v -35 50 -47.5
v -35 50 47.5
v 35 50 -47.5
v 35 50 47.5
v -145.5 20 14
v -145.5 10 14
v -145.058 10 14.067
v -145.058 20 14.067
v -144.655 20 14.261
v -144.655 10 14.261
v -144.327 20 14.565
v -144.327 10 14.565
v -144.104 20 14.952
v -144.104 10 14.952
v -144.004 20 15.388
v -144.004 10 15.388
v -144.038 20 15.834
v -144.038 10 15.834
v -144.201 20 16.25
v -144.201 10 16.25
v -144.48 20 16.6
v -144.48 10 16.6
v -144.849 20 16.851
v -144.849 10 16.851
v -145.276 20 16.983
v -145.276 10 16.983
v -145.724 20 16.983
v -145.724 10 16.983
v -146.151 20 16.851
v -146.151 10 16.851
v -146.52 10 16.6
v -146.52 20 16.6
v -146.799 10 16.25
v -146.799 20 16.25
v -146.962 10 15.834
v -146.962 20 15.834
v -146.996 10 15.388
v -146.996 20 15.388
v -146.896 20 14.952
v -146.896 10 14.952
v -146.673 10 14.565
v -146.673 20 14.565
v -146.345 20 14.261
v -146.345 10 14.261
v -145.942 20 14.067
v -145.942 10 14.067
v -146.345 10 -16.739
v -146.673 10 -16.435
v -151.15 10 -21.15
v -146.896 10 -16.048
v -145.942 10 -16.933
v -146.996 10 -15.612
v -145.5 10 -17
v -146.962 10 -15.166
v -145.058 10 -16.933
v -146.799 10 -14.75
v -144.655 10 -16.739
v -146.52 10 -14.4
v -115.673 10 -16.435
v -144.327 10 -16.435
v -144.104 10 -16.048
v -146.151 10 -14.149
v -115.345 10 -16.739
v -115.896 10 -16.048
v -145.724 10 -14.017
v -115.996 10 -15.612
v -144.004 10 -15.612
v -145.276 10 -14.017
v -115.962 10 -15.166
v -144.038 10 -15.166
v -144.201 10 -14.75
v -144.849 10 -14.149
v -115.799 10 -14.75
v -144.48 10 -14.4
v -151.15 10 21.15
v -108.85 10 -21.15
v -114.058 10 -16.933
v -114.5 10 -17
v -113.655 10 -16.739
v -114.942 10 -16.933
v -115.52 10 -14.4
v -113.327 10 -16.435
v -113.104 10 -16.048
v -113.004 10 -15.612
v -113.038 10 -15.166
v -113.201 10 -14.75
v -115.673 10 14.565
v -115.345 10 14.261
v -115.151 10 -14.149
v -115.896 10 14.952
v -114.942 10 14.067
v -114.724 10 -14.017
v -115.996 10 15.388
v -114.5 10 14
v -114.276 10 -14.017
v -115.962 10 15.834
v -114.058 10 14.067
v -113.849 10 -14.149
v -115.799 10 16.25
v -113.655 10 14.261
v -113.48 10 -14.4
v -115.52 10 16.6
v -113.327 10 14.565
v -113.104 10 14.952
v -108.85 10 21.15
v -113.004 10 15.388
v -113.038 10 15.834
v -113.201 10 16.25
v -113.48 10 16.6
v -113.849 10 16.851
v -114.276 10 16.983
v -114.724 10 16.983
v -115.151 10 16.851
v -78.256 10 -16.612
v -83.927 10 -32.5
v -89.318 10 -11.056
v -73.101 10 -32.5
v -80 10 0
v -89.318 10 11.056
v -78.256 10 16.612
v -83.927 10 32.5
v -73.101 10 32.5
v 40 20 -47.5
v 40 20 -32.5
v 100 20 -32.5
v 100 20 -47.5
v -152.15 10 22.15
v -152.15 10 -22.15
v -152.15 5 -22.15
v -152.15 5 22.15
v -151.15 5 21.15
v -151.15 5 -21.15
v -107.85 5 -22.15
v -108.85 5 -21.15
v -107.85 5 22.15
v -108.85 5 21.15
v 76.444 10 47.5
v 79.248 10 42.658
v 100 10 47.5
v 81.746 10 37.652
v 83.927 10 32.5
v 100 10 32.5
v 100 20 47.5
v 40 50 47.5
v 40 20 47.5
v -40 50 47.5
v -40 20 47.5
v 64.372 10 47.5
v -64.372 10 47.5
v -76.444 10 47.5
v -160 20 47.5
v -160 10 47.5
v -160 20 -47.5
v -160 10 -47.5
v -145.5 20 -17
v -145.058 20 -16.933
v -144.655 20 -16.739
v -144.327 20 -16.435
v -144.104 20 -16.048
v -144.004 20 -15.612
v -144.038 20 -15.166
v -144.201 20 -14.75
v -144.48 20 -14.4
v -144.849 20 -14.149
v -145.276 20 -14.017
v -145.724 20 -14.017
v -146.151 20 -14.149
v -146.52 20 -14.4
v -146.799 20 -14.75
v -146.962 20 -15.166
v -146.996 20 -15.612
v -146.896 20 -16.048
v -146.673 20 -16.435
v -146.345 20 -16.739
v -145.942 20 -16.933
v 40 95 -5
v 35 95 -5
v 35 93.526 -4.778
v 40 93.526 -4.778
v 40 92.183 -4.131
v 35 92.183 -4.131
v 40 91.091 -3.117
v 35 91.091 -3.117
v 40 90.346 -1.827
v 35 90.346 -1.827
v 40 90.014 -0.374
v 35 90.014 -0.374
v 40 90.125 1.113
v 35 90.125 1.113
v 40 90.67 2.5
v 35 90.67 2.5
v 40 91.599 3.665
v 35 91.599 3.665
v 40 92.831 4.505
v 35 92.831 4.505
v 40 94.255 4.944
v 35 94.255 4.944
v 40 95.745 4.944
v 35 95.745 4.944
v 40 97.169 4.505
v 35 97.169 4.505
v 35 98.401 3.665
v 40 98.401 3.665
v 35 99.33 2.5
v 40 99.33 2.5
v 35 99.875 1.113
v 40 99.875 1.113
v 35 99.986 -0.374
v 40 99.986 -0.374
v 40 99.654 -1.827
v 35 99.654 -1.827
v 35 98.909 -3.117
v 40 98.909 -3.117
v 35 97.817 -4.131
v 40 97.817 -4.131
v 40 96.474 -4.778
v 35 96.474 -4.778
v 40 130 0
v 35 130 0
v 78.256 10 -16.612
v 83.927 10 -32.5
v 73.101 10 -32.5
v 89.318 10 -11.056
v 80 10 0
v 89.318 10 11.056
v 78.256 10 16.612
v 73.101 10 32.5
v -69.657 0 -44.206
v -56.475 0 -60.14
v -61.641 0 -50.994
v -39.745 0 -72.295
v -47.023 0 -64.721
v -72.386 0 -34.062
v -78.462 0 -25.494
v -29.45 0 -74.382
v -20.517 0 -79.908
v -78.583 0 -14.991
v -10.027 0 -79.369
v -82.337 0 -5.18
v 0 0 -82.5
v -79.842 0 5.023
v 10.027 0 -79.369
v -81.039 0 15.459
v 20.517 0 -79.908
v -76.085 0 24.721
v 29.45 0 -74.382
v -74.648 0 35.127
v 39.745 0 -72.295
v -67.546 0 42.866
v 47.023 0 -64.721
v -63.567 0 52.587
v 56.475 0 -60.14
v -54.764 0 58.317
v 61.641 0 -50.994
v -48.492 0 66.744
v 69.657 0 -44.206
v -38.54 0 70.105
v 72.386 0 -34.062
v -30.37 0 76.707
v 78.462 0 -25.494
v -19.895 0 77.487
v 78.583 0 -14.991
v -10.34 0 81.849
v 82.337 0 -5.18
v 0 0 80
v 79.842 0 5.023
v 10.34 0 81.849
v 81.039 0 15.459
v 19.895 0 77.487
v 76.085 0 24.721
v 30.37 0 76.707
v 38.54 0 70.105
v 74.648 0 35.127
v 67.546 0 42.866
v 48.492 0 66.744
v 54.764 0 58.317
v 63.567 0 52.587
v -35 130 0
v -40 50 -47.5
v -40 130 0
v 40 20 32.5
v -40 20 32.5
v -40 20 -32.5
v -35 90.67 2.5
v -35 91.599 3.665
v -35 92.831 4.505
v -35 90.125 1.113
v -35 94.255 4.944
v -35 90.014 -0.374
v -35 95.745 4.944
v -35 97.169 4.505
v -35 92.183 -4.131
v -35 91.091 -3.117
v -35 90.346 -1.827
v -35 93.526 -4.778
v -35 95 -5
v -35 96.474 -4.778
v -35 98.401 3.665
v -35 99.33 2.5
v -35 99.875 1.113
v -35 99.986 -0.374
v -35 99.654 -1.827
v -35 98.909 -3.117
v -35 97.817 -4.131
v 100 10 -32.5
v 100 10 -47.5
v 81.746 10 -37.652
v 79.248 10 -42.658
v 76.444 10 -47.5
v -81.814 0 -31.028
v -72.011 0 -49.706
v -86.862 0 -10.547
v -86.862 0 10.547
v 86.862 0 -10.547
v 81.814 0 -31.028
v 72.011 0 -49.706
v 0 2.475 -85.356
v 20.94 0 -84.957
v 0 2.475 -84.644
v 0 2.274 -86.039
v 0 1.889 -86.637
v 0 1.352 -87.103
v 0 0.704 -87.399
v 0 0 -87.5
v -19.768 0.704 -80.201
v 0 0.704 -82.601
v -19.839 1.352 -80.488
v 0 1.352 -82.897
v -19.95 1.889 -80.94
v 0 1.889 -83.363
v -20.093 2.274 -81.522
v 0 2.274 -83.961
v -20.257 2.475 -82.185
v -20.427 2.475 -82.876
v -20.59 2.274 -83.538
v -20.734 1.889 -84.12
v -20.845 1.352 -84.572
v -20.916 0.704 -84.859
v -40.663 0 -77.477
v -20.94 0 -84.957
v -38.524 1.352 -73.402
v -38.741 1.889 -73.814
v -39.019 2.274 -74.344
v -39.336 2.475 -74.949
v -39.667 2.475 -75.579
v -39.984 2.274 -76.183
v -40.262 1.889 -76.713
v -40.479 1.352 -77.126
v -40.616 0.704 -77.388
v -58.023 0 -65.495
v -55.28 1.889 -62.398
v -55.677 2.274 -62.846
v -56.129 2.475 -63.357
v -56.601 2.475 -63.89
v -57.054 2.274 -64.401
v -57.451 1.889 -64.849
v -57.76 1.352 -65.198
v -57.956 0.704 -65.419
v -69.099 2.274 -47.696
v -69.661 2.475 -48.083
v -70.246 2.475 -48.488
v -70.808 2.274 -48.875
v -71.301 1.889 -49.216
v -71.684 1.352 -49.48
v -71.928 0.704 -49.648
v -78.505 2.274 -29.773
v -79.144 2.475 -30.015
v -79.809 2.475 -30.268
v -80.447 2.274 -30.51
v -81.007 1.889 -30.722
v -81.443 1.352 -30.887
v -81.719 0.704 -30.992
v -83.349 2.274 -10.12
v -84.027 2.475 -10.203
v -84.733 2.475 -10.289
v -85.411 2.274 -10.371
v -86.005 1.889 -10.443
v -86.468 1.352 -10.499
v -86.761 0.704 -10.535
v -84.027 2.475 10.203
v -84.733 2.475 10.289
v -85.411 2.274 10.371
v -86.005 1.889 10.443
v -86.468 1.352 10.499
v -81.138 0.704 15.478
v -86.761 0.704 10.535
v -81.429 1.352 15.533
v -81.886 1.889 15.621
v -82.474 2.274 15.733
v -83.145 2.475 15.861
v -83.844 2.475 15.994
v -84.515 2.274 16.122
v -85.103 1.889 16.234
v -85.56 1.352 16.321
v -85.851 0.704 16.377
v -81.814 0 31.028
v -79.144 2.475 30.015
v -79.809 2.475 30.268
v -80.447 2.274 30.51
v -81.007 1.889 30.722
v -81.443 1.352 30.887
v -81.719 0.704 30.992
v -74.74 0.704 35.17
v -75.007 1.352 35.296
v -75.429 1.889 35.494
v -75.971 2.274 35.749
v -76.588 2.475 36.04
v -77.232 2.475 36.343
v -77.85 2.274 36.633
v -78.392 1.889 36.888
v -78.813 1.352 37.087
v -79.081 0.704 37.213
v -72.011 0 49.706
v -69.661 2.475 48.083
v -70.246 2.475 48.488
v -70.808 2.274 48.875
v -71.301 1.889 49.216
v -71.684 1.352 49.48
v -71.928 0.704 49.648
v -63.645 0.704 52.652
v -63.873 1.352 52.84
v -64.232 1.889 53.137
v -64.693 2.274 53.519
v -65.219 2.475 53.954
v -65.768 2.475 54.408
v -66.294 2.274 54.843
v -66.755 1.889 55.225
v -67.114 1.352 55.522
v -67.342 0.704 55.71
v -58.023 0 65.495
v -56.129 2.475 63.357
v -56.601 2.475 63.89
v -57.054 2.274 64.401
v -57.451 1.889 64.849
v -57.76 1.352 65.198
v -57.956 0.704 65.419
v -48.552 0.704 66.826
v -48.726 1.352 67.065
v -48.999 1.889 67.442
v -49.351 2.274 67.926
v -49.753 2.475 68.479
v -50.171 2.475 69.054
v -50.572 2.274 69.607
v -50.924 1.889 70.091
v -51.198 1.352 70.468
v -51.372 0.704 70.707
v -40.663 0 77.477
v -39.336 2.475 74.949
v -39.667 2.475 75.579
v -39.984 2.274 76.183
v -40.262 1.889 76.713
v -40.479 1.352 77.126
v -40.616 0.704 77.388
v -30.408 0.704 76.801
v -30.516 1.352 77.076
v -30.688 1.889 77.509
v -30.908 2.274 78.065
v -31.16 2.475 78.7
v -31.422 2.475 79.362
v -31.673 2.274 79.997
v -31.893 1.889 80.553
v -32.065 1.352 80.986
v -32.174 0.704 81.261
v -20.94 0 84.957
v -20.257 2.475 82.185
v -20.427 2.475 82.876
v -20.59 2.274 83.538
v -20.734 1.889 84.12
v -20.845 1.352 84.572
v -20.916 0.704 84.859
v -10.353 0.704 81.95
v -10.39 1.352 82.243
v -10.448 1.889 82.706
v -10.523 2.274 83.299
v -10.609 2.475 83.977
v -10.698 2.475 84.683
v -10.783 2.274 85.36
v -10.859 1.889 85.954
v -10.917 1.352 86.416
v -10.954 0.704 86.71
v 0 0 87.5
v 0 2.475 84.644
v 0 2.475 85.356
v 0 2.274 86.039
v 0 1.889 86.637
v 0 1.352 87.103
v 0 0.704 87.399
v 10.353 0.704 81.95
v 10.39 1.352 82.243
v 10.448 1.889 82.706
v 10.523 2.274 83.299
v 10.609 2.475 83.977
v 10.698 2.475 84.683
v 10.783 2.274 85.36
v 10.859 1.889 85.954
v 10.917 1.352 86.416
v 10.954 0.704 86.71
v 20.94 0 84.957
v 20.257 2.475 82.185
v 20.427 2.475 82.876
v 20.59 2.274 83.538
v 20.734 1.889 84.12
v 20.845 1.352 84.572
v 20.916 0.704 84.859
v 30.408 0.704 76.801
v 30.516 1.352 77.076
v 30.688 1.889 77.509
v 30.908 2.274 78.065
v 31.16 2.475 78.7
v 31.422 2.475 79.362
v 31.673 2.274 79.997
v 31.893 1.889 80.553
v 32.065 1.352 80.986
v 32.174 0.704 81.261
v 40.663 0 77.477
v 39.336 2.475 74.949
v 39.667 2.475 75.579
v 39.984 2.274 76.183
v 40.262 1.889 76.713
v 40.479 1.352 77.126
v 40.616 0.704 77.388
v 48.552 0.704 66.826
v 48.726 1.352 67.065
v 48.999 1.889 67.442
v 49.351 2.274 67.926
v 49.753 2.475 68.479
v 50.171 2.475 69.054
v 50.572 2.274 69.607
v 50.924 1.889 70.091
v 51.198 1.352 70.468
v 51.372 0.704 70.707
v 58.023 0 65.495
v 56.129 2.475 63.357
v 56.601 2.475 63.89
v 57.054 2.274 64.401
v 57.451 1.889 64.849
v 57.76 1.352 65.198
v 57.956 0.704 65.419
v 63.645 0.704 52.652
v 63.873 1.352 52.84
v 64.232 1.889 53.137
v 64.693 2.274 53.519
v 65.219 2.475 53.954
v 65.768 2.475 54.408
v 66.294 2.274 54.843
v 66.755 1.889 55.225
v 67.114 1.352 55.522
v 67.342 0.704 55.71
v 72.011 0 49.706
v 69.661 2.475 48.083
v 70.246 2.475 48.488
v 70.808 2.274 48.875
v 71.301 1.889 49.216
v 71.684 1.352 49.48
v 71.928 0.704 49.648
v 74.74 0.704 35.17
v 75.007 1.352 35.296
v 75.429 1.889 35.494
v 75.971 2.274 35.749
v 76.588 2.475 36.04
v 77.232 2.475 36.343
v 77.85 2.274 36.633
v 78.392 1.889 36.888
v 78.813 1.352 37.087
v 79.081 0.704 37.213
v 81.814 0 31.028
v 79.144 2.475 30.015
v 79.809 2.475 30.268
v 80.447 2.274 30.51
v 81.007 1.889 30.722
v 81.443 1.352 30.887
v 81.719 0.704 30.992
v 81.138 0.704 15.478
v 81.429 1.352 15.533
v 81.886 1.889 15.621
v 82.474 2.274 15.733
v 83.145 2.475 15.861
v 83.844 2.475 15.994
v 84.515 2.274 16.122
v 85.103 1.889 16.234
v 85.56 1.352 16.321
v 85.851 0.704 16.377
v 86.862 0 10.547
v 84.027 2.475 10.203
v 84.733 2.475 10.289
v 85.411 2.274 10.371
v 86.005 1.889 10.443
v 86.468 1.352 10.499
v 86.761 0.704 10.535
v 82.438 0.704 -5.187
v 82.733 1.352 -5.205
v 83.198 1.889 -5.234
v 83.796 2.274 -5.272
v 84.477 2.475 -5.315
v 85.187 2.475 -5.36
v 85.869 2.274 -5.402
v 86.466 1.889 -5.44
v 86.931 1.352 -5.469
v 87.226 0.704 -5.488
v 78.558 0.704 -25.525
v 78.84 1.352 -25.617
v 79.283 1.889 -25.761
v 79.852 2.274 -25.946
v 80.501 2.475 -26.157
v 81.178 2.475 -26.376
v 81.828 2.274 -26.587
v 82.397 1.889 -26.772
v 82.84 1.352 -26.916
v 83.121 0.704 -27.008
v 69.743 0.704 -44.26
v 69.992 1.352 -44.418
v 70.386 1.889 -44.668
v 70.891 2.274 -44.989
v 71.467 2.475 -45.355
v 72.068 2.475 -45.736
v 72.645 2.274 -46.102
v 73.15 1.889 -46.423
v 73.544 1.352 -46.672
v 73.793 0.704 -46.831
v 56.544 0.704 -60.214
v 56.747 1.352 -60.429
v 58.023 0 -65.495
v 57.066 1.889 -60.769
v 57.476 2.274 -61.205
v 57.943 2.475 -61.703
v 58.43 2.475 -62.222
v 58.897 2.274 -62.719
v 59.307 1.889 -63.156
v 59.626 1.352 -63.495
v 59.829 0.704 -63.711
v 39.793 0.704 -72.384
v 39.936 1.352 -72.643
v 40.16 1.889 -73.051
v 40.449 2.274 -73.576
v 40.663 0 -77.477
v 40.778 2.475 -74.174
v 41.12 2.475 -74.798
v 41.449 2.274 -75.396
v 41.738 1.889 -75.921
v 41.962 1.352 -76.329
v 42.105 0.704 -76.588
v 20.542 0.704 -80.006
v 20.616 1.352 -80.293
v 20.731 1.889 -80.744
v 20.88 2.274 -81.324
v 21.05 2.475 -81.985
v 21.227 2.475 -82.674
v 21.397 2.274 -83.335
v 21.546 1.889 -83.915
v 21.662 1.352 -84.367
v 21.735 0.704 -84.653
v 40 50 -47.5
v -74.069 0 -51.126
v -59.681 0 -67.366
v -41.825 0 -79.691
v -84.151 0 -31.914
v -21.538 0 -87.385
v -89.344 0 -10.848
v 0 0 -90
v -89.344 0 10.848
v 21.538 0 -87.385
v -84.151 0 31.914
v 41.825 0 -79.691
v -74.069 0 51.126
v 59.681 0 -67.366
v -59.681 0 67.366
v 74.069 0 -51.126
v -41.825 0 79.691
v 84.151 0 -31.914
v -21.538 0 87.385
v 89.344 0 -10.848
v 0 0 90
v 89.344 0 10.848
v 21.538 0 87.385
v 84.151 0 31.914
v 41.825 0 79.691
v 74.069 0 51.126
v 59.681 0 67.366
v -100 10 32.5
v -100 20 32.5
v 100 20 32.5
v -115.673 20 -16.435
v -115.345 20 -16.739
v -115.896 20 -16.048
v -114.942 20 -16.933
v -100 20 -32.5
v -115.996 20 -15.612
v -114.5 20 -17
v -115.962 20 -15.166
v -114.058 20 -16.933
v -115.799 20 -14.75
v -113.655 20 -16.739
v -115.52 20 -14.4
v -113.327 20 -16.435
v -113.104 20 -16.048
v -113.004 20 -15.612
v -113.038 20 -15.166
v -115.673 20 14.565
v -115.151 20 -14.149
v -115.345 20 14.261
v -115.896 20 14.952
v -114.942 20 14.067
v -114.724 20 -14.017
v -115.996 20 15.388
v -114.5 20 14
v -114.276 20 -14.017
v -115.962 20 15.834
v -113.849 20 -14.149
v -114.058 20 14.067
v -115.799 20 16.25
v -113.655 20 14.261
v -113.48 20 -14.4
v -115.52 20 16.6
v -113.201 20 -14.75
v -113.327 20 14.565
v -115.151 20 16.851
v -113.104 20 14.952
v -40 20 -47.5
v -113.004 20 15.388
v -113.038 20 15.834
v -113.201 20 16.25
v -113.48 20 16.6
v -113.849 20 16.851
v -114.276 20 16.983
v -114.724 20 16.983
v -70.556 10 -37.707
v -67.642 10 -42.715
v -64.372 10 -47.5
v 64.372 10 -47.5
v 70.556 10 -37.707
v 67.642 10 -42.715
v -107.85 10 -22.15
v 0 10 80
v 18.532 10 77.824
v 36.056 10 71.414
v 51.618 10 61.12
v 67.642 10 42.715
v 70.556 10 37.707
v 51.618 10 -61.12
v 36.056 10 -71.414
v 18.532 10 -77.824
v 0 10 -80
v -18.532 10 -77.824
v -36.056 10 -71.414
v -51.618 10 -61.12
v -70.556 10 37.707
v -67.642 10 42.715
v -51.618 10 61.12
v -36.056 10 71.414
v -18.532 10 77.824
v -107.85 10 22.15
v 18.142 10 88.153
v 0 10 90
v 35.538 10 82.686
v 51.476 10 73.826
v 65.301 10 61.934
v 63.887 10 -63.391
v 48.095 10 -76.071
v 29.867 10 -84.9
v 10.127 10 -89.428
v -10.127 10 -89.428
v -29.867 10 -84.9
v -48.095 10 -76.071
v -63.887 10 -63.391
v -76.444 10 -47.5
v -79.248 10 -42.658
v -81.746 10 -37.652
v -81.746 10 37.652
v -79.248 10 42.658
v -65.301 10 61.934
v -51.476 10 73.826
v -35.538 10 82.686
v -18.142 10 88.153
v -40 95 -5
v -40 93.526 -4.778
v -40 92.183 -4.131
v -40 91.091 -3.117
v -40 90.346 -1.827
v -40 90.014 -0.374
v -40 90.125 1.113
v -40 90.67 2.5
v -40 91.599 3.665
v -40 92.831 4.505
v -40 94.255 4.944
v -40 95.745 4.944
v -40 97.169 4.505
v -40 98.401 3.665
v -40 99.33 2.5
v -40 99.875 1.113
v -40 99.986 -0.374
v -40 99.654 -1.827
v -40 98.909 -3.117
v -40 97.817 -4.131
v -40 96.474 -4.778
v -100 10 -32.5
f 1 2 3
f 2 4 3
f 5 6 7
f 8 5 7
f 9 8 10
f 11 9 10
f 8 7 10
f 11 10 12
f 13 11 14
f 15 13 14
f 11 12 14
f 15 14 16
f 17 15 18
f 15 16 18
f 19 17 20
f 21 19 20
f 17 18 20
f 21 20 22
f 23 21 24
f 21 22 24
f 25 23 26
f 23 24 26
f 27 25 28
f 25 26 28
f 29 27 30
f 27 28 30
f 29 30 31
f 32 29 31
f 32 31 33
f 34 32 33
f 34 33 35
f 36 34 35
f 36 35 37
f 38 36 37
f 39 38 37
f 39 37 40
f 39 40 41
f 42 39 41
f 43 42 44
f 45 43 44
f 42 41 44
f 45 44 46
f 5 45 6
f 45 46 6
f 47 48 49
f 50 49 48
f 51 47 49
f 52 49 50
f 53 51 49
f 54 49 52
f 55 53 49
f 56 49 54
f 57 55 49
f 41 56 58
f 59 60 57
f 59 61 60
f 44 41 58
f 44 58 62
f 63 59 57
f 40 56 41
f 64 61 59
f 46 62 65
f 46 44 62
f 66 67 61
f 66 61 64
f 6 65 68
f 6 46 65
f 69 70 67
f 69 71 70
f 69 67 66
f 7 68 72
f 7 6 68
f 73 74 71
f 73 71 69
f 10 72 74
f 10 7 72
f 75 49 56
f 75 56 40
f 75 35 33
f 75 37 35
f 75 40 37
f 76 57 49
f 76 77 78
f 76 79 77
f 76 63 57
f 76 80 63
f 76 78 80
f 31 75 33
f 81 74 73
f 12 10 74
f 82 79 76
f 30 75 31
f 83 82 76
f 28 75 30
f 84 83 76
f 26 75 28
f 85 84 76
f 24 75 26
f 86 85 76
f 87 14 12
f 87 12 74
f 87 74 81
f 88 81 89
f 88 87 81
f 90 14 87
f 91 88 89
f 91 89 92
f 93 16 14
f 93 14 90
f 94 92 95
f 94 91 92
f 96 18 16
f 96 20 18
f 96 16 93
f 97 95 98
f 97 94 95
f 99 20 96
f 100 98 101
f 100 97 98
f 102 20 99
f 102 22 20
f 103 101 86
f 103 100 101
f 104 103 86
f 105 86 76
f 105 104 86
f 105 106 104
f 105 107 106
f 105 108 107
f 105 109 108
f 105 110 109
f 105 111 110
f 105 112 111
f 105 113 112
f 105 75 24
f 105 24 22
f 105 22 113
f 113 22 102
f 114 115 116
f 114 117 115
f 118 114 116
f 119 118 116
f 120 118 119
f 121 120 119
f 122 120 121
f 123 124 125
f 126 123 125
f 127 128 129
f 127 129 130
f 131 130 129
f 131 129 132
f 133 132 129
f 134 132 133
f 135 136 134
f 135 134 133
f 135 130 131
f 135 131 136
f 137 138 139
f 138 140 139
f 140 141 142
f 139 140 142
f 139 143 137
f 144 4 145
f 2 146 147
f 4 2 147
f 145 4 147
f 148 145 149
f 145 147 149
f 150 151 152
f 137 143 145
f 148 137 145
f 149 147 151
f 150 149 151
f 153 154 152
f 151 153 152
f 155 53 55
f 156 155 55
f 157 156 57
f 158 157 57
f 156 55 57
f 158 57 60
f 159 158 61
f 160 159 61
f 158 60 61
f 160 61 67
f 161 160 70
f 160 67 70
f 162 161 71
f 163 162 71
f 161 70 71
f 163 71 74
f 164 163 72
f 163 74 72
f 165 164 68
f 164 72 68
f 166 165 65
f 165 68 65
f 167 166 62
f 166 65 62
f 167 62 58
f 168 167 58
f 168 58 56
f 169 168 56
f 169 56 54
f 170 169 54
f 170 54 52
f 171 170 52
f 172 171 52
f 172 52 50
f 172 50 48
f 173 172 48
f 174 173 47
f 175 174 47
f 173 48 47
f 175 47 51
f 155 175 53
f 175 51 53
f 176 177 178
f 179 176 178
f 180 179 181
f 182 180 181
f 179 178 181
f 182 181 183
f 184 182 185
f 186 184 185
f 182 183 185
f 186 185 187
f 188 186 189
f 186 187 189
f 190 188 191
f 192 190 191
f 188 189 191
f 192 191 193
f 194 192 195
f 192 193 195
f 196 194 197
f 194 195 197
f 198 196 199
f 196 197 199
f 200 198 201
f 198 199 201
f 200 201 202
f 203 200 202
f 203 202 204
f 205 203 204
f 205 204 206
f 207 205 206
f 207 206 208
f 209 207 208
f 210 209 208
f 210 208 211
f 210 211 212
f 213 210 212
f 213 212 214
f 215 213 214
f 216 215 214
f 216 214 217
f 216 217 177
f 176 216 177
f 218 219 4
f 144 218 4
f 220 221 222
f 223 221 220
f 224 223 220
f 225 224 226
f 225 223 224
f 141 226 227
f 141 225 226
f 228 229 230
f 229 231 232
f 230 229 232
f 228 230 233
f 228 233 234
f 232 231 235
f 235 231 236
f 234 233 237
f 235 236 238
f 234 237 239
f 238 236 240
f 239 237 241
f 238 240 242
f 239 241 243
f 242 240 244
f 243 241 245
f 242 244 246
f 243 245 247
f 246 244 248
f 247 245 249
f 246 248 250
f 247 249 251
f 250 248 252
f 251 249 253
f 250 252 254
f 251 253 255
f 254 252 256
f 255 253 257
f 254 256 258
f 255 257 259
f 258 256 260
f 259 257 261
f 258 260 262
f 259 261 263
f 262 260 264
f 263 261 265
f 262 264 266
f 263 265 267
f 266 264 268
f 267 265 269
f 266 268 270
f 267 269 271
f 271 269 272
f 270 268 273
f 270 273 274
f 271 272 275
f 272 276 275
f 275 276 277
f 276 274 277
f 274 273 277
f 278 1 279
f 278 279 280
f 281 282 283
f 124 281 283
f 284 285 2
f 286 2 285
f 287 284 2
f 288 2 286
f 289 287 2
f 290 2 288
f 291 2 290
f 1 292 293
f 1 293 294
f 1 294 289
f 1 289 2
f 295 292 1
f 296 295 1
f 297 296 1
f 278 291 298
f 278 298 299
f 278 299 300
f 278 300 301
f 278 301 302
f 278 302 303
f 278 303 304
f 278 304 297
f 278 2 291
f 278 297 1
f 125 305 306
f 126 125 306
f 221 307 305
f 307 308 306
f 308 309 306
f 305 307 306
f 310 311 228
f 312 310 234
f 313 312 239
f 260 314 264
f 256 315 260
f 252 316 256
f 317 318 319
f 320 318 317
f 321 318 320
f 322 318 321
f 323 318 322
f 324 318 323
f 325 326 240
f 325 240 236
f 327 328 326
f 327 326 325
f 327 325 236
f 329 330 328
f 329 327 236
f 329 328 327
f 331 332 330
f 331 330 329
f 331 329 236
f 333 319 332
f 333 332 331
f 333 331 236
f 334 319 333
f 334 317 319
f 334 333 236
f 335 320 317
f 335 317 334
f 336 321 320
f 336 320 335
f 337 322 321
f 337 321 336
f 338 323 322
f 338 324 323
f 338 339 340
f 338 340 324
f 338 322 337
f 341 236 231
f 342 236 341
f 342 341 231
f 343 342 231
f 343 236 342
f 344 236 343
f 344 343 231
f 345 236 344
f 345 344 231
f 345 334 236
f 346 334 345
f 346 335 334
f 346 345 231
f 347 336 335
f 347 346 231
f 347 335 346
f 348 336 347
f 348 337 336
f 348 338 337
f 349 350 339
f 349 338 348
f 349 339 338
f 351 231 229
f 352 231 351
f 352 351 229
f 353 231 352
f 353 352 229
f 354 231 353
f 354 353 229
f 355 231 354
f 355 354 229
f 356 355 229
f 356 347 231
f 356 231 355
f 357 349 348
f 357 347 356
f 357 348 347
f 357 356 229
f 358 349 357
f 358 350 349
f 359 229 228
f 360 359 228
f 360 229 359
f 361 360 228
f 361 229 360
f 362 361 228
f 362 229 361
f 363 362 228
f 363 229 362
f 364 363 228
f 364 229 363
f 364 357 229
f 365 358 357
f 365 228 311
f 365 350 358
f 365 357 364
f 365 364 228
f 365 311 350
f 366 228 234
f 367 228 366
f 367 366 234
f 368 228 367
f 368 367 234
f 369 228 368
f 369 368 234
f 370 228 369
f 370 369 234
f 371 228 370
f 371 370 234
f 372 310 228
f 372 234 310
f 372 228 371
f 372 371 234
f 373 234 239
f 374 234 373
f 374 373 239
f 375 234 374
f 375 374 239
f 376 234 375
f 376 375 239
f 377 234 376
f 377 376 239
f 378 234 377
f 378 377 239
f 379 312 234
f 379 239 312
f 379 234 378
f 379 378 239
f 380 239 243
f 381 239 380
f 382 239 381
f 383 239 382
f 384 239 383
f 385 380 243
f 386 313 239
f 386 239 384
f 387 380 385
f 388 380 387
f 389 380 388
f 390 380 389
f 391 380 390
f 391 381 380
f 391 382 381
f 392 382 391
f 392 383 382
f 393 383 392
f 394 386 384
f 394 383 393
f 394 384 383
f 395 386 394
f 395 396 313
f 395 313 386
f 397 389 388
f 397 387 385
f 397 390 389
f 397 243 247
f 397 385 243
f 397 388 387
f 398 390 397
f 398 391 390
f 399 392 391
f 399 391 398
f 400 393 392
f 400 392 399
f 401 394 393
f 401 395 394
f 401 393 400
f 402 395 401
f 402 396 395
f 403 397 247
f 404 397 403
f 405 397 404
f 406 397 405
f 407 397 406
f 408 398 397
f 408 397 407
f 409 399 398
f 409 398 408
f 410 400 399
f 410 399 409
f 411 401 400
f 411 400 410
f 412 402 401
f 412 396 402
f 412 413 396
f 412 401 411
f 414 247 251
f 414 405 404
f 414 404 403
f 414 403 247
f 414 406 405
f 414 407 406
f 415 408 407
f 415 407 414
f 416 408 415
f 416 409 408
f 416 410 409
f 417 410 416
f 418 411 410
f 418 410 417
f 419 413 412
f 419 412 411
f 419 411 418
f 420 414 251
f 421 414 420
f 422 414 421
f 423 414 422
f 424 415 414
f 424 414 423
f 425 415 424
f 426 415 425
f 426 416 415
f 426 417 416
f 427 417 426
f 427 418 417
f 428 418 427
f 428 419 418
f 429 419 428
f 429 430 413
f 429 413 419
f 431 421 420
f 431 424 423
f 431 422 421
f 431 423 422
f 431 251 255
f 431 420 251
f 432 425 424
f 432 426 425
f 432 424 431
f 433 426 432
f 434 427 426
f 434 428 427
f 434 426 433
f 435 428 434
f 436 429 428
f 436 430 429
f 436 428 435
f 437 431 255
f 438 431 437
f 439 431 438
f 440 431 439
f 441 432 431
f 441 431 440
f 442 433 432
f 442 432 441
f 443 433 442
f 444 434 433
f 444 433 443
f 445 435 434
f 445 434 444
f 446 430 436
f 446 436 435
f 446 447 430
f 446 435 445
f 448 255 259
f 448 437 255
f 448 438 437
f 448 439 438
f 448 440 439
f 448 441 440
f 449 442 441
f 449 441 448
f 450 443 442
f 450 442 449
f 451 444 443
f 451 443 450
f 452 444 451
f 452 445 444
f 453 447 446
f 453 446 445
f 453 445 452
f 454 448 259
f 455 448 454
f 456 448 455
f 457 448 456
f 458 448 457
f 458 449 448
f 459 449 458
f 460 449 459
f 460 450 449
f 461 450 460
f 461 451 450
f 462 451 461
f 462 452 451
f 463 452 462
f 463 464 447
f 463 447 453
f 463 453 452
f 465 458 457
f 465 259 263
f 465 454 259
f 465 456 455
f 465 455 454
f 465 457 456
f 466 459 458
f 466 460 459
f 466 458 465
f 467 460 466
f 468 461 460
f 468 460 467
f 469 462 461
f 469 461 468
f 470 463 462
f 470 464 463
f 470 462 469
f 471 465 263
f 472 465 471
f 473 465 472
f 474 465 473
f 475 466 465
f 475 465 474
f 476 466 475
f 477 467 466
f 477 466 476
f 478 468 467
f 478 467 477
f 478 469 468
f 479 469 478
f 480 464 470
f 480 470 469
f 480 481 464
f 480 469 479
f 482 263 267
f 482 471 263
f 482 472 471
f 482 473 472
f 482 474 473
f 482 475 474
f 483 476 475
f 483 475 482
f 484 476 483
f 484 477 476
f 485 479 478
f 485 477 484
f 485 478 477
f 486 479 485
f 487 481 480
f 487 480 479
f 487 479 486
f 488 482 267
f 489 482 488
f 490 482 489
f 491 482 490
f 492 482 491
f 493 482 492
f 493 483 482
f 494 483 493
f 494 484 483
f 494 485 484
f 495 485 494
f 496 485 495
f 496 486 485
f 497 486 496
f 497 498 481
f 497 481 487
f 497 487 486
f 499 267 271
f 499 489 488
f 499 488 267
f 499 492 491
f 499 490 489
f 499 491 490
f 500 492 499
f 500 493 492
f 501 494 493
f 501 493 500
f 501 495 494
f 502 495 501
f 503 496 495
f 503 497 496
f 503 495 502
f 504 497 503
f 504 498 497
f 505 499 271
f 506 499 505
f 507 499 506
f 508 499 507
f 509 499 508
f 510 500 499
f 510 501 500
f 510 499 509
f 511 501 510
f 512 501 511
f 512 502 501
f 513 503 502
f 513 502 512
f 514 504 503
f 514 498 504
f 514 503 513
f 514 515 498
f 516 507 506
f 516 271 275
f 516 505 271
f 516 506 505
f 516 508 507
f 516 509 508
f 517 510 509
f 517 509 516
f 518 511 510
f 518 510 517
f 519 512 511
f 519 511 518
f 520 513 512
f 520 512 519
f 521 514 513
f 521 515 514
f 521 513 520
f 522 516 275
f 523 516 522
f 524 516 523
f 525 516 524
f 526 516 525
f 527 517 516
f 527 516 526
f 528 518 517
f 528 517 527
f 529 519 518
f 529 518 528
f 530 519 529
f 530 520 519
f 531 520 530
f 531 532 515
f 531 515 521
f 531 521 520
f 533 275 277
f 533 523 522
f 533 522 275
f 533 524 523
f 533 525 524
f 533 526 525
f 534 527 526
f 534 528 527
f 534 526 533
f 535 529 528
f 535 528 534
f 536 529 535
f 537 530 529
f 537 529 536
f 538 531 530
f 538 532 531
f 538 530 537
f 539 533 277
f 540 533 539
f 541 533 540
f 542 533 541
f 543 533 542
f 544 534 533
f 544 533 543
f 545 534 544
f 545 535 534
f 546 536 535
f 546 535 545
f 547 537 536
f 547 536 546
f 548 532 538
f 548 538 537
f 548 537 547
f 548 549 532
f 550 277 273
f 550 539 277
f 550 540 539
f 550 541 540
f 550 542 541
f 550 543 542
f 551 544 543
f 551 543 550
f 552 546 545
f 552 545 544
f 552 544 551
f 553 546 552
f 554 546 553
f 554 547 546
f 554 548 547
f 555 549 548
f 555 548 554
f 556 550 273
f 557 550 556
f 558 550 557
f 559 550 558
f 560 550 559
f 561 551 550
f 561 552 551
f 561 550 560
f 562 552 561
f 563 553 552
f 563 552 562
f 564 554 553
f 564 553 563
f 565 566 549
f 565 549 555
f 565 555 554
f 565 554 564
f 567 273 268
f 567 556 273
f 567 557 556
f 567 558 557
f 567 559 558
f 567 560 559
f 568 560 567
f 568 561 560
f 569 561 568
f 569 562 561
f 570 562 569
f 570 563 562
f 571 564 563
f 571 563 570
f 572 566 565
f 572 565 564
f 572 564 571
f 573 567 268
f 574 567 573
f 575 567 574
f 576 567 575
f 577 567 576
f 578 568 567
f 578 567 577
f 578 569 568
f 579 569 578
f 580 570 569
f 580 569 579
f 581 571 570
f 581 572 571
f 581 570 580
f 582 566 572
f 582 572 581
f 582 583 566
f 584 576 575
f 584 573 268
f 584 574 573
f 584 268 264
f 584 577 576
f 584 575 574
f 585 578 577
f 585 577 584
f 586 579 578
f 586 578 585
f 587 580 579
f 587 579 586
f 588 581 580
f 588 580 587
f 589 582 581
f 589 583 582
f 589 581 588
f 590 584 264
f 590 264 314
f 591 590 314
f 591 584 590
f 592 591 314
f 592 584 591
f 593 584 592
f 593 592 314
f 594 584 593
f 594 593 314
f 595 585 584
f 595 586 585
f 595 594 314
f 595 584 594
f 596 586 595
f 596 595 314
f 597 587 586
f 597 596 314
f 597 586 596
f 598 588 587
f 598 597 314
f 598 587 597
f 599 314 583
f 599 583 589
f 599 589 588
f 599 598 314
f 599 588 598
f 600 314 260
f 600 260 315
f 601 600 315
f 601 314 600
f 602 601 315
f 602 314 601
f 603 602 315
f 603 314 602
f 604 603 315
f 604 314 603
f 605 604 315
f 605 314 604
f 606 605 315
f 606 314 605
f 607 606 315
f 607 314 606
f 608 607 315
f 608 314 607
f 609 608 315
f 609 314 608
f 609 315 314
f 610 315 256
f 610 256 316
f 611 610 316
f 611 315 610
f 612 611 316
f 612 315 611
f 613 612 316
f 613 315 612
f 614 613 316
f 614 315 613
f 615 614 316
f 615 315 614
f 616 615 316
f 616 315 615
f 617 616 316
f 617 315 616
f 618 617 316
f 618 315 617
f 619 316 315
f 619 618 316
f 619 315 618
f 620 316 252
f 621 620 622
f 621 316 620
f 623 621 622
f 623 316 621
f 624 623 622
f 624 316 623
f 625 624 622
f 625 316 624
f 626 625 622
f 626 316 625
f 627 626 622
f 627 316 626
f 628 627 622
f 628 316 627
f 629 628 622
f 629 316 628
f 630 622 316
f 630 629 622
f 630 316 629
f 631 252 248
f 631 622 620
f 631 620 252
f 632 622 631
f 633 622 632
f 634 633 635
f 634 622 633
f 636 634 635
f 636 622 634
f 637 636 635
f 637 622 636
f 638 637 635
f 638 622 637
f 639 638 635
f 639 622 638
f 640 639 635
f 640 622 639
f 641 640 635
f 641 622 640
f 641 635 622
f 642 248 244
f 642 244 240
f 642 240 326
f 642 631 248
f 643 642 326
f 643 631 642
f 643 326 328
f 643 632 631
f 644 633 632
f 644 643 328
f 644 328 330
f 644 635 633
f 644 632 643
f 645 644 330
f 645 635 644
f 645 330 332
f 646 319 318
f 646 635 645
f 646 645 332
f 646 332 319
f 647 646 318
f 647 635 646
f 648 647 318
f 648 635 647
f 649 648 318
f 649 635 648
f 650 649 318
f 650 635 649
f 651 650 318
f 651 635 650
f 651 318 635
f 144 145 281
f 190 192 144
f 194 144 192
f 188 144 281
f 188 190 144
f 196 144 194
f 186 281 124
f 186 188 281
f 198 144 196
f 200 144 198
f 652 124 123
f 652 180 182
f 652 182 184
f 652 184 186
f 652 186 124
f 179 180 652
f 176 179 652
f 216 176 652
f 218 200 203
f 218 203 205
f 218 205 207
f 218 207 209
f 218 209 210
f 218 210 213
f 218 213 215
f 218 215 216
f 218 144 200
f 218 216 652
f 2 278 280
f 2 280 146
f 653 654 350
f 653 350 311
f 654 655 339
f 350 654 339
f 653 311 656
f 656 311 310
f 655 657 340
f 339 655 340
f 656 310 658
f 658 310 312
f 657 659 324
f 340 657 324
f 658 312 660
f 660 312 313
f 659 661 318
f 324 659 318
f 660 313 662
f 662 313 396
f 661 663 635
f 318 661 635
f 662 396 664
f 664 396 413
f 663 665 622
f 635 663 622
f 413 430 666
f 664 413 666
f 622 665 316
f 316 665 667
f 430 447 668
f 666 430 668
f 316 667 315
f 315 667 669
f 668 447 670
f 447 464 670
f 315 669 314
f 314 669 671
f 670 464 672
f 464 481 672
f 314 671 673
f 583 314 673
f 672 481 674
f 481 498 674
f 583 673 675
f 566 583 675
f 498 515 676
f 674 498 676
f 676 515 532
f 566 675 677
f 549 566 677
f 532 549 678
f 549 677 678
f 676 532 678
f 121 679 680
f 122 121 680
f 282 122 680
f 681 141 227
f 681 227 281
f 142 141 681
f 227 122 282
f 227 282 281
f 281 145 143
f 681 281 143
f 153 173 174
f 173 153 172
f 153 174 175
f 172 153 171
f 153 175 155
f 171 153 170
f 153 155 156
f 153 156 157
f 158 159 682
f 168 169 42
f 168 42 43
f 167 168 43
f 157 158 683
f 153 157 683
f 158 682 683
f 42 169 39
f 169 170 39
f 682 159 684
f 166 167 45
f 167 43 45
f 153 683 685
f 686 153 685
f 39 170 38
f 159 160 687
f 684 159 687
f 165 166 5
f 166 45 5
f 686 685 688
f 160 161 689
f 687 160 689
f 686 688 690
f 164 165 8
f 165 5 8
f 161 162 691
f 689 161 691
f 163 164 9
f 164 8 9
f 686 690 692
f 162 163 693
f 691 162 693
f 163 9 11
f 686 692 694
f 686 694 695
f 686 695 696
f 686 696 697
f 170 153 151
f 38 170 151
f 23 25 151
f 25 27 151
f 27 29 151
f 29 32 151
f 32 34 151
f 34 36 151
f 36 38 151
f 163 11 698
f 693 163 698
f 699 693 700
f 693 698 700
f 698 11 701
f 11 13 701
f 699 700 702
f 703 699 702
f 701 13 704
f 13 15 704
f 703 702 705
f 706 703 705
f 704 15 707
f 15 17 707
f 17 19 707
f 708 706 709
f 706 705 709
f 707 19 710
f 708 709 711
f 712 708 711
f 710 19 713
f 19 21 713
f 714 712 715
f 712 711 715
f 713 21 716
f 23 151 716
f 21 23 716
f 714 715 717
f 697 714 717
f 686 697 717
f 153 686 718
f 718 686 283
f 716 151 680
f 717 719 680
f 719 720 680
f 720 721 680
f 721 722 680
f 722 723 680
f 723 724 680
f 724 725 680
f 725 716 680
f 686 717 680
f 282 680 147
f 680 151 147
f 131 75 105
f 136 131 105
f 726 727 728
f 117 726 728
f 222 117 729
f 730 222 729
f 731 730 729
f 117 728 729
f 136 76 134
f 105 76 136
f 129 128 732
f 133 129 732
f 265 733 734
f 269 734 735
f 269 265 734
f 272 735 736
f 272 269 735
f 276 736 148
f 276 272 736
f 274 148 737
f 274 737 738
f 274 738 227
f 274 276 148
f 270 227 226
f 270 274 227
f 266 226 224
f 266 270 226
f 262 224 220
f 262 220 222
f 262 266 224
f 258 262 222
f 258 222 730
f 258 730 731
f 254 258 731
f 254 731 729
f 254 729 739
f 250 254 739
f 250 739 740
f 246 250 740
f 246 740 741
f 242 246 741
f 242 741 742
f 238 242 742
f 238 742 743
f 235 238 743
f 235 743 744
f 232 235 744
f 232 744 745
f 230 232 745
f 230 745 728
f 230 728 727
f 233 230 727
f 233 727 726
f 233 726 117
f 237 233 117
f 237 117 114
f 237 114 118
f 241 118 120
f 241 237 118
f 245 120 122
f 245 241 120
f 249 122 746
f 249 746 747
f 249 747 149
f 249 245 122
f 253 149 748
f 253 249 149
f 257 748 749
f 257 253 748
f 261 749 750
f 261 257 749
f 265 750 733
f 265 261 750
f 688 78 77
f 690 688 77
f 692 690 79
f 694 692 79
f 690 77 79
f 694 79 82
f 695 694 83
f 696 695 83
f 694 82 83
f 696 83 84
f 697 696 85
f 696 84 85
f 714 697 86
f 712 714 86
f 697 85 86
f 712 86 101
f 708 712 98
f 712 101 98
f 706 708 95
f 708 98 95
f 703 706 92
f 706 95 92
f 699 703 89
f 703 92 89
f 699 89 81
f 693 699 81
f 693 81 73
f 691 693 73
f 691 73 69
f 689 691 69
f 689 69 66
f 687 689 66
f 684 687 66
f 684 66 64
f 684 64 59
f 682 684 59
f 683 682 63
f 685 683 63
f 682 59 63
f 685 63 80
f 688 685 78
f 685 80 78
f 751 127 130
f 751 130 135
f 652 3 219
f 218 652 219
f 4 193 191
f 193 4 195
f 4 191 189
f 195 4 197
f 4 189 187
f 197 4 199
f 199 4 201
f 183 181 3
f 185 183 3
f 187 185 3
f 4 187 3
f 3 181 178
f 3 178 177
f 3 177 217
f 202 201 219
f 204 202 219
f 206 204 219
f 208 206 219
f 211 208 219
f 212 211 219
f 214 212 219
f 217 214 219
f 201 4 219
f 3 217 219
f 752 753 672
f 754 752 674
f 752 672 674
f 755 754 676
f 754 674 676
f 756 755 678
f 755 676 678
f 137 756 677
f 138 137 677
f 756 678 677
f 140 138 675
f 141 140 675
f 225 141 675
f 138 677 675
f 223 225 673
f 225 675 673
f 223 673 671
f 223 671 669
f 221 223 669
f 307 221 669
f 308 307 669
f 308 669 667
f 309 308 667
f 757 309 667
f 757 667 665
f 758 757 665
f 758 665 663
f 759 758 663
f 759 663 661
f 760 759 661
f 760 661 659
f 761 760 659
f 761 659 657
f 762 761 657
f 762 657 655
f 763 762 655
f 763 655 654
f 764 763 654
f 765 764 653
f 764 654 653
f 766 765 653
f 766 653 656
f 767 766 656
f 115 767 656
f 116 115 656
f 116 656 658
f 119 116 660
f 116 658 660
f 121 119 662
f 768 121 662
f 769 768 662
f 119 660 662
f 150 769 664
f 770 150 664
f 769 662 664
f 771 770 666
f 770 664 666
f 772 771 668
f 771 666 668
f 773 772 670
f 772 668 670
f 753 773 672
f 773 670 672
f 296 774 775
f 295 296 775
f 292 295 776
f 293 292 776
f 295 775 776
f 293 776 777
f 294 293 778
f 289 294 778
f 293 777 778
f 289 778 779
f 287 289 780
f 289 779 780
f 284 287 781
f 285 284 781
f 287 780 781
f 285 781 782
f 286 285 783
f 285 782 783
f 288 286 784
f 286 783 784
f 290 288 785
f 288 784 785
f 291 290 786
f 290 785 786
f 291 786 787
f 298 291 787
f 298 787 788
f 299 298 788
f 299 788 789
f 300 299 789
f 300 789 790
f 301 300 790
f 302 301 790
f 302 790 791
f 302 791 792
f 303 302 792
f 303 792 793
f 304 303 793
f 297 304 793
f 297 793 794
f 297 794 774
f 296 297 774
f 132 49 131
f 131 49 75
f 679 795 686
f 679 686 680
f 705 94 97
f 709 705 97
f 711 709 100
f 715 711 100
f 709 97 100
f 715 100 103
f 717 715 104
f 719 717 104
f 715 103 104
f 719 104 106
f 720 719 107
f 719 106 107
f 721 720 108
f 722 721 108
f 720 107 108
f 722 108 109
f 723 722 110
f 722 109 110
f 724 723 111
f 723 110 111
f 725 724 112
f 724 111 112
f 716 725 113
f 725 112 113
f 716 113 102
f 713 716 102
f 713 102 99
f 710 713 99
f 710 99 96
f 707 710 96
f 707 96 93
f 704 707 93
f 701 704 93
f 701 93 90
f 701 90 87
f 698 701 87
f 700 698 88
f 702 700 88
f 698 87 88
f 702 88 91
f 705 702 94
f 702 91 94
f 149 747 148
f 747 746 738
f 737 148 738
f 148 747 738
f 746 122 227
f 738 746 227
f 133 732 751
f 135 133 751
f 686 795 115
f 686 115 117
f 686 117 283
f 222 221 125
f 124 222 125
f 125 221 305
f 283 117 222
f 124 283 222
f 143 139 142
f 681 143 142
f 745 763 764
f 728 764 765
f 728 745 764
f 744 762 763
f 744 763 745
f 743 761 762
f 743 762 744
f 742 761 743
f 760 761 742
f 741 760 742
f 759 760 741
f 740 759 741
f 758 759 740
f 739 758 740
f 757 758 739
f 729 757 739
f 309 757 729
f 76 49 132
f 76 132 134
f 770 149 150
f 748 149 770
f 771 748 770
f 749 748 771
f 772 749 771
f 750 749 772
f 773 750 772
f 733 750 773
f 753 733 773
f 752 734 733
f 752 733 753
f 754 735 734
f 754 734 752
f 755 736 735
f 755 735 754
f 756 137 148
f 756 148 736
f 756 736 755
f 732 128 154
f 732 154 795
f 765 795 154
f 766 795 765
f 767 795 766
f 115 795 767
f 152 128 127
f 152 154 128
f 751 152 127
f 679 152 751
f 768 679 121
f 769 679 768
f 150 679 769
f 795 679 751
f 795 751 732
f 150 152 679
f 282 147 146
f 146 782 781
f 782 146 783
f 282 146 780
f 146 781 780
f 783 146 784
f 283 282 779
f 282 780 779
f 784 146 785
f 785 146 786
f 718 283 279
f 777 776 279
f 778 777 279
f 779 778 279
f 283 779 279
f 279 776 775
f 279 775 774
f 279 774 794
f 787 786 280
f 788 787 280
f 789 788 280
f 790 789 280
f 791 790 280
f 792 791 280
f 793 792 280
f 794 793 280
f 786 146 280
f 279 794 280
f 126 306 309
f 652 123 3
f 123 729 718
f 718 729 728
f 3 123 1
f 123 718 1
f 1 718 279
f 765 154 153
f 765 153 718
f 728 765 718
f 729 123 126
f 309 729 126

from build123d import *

# Parameters (mm, degrees)
SKETCH1_R           = 90
SKETCH1_R_2         = 80
BOSS_EXTRUDE1_DEPTH = 10
SKETCH2_R           = 2.5
SKETCH3_W           = 200
SKETCH3_H           = 15
BOSS_EXTRUDE2_DEPTH = 10
SKETCH5_W           = 60
SKETCH5_H           = 95
SKETCH5_R           = 1.5
BOSS_EXTRUDE3_DEPTH = 10
SKETCH7_W           = 44.3
SKETCH7_H           = 44.3
SKETCH7_W_2         = 42.3
SKETCH7_H_2         = 42.3
BOSS_EXTRUDE4_DEPTH = 5
SKETCH8_W           = 95
SKETCH8_H           = 30
BOSS_EXTRUDE5_DEPTH = 35
BOSS_EXTRUDE7_DEPTH = 5
SKETCH10_R          = 5
CUT_EXTRUDE1_DEPTH  = 212.187120819


with BuildPart() as part:
    # Sketch1 → Boss-Extrude1 (new body)
    with BuildSketch(Plane(origin=(0, 0, 0), x_dir=(1, 0, 0), z_dir=(0, 1, 0))):
        with Locations(Location((0, 0, 0), (0, 0, 270))):
            Circle(SKETCH1_R)
        with Locations(Location((0, 0, 0), (0, 0, 270))):
            Circle(SKETCH1_R_2, mode=Mode.SUBTRACT)
    extrude(amount=BOSS_EXTRUDE1_DEPTH)

    # Sketch2 → Cut-Revolve1 (revolve, cut)
    with BuildSketch(Plane.XY, mode=Mode.PRIVATE) as cut_revolve1_sk:
        with Locations((-85, 0)):
            Circle(SKETCH2_R)
    revolve(cut_revolve1_sk.sketch.rotate(Axis((0, 0, 0), (0, 1, 0)), 270), axis=Axis((0, 0, 0), (0, 1, 0)), mode=Mode.SUBTRACT)

    # Sketch3 → Boss-Extrude2 (add)
    with BuildSketch(Plane(origin=(0, 10, 0), x_dir=(1, 0, 0), z_dir=(0, 1, 0))):
        with Locations((0, -40)):
            Rectangle(SKETCH3_W, SKETCH3_H)
        with Locations((0, 40)):
            Rectangle(SKETCH3_W, SKETCH3_H)
    extrude(amount=BOSS_EXTRUDE2_DEPTH)

    # Sketch5 → Boss-Extrude3 (add)
    with BuildSketch(Plane.XZ.offset(-10)):
        with Locations((-130, 0)):
            Rectangle(SKETCH5_W, SKETCH5_H)
        with Locations(Location((-145.5, -15.5, 0), (0, 0, 270))):
            Circle(SKETCH5_R, mode=Mode.SUBTRACT)
        with Locations(Location((-114.5, -15.5, 0), (0, 0, 270))):
            Circle(SKETCH5_R, mode=Mode.SUBTRACT)
        with Locations(Location((-114.5, 15.5, 0), (0, 0, 270))):
            Circle(SKETCH5_R, mode=Mode.SUBTRACT)
        with Locations(Location((-145.5, 15.5, 0), (0, 0, 270))):
            Circle(SKETCH5_R, mode=Mode.SUBTRACT)
    extrude(amount=-BOSS_EXTRUDE3_DEPTH)

    # Sketch7 → Boss-Extrude4 (add)
    with BuildSketch(Plane.XZ.offset(-10)):
        with Locations((-130, 0)):
            Rectangle(SKETCH7_W, SKETCH7_H)
        with Locations((-130, 0)):
            Rectangle(SKETCH7_W_2, SKETCH7_H_2, mode=Mode.SUBTRACT)
    extrude(amount=BOSS_EXTRUDE4_DEPTH)

    # Sketch8 → Boss-Extrude5 (add, symmetric)
    with BuildSketch(Plane(origin=(0, 0, 0), x_dir=(0, 0, -1), z_dir=(1, 0, 0))):
        with Locations((0, 35)):
            Rectangle(SKETCH8_W, SKETCH8_H)
    extrude(amount=BOSS_EXTRUDE5_DEPTH, both=True)

    # Sketch9 → Boss-Extrude7 (add)
    with BuildSketch(Plane.ZY.offset(35)):
        Polygon((-47.5, 50), (0, 130), (47.5, 50), (47.5, 20), (-47.5, 20), align=None)
    boss_extrude7 = extrude(amount=BOSS_EXTRUDE7_DEPTH)

    # Mirror1: Boss-Extrude7 across plane
    add(boss_extrude7.mirror(Plane(origin=(0, 0, 0), x_dir=(0, 0, 1), z_dir=(1, 0, 0))))

    # Sketch10 → Cut-Extrude1 (cut, through all)
    with BuildSketch(Plane.ZY.offset(40)):
        with Locations(Location((0, 95, 0), (0, 0, 180))):
            Circle(SKETCH10_R)
    extrude(amount=-CUT_EXTRUDE1_DEPTH, mode=Mode.SUBTRACT)


solid = part.part
